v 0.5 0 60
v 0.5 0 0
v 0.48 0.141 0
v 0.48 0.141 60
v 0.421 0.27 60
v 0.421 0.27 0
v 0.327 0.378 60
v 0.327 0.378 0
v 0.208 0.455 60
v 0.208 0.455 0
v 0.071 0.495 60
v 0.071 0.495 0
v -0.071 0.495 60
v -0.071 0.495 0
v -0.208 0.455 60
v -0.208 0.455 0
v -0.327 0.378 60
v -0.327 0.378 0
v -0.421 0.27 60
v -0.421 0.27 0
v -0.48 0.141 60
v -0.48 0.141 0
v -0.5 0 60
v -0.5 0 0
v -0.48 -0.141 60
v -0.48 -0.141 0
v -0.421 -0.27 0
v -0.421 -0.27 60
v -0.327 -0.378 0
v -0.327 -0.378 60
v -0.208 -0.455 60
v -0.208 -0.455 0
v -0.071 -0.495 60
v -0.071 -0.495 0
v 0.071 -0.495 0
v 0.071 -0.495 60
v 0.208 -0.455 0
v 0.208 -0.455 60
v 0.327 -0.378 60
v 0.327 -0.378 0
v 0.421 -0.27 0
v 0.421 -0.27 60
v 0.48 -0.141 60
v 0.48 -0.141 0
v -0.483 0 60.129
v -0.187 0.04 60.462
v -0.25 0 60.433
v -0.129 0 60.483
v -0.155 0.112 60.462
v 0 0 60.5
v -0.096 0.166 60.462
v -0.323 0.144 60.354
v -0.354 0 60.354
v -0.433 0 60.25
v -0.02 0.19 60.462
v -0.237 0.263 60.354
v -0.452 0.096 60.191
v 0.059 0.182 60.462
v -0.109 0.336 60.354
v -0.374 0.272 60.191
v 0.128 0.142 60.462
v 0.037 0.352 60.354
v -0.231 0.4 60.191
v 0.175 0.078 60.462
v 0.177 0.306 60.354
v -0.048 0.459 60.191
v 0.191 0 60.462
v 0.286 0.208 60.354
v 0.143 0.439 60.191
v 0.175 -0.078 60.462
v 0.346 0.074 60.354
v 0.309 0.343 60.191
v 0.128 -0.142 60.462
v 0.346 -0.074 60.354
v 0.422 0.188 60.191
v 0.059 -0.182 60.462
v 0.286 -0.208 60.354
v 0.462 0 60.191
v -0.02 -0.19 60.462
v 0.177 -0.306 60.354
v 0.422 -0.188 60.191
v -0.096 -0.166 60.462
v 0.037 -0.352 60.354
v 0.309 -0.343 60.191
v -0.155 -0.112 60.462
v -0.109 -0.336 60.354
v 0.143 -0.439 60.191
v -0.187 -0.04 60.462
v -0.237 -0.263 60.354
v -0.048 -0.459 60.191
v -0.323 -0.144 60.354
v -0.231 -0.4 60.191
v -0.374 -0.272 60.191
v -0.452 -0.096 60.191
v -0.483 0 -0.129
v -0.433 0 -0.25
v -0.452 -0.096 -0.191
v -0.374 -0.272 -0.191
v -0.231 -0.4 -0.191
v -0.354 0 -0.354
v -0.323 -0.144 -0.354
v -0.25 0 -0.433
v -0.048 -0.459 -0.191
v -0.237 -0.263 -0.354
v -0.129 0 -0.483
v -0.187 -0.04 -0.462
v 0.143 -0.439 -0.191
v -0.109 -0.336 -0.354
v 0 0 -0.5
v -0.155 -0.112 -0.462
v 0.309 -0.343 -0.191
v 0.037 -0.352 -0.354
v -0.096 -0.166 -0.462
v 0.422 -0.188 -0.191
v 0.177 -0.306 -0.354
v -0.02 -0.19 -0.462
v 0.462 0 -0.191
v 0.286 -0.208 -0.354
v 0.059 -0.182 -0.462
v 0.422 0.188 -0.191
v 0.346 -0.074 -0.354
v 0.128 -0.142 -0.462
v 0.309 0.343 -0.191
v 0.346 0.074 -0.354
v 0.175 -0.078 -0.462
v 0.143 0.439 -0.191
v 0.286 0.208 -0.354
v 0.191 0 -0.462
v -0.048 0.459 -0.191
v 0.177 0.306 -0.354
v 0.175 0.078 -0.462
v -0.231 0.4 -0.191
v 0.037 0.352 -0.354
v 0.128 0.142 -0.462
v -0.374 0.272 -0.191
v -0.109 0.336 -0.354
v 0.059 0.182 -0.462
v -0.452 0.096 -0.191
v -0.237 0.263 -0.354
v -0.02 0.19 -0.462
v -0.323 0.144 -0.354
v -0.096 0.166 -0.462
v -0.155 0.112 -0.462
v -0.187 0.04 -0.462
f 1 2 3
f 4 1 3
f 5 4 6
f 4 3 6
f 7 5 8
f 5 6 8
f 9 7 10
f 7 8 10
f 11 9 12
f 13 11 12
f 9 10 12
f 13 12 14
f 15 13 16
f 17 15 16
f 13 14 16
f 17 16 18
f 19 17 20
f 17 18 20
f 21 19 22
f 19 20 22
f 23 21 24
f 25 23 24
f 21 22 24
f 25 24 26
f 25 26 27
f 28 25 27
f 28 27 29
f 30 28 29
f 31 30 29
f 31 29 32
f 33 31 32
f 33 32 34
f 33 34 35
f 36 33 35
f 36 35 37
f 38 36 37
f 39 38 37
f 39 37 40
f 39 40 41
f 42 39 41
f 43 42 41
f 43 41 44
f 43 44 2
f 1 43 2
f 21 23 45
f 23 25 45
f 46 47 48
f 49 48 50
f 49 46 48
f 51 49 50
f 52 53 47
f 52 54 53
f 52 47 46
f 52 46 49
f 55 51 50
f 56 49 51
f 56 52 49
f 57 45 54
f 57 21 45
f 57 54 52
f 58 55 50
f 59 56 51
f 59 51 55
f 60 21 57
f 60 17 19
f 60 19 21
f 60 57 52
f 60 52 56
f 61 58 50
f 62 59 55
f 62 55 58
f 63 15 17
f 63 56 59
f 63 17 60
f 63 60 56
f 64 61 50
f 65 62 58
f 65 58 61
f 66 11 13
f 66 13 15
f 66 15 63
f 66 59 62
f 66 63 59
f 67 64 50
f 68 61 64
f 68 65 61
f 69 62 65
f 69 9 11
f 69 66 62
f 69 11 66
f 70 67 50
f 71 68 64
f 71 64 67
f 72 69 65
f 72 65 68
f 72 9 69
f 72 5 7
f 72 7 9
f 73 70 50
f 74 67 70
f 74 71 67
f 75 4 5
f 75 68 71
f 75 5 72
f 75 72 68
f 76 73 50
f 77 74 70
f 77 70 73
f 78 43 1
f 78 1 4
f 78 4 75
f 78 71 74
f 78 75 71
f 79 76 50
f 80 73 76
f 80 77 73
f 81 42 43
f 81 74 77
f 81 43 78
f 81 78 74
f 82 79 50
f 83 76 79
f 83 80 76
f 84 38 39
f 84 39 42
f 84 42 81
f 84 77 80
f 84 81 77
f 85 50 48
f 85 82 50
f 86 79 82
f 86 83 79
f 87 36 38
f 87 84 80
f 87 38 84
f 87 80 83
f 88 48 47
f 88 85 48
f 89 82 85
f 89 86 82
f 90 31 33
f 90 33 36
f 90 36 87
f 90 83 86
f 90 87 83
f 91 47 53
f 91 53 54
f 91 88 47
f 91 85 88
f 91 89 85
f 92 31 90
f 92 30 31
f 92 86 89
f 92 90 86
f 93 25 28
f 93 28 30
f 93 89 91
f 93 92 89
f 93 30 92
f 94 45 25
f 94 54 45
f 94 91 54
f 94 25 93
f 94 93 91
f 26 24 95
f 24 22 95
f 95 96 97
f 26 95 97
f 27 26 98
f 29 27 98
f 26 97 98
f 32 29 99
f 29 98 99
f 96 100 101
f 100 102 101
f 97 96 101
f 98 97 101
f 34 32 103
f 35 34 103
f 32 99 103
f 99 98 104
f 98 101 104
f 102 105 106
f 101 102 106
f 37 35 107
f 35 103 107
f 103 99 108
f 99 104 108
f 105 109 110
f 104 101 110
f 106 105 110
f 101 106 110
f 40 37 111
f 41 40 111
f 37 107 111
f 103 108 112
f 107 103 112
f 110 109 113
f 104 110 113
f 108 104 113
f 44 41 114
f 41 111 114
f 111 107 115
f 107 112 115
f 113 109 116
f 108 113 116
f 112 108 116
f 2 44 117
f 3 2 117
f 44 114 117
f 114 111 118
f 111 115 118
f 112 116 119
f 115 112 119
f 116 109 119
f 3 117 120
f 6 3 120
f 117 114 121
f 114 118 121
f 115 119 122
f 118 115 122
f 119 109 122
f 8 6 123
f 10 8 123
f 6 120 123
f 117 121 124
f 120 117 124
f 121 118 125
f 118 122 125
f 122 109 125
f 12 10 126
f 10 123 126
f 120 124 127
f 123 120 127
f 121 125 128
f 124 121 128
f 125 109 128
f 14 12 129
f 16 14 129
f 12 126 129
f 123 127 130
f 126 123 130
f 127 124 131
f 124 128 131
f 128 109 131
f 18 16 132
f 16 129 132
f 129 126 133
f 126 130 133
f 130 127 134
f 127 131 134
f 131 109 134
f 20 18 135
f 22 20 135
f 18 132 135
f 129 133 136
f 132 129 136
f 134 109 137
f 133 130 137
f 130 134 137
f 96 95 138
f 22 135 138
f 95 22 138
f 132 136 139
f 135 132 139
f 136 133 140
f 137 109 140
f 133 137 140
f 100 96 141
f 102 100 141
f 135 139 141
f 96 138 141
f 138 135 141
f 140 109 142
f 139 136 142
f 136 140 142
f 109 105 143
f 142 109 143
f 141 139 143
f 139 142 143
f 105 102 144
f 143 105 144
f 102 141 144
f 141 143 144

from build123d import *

# Parameters (mm, degrees)
ESQUISSE2_R          = 0.5
BASE_EXTRUSION_DEPTH = 60


with BuildPart() as part:
    # Esquisse2 → Base-Extrusion (new body)
    with BuildSketch(Plane.XY):
        Circle(ESQUISSE2_R)
    extrude(amount=BASE_EXTRUSION_DEPTH)

    # Esquisse7 → Boss.-Révol.1 (revolve)
    with BuildSketch(Plane(origin=(0, 0, 0), x_dir=(1, 0, 0), z_dir=(0, 1, 0))):
        with BuildLine():
            Line((0, -60), (0, -60.5))
            ThreePointArc((0, -60.5), (-0.353553391, -60.353553391), (-0.5, -60))
            Line((-0.5, -60), (0, -60))
        make_face()
    revolve(axis=Axis((0, 0, 66.095405801), (0, 0, -1)))

    # Esquisse8 → Boss.-Révol.2 (revolve)
    with BuildSketch(Plane(origin=(0, 0, 0), x_dir=(1, 0, 0), z_dir=(0, 1, 0))):
        with BuildLine():
            Line((0, 0), (-0.5, 0))
            ThreePointArc((-0.5, 0), (-0.353553391, 0.353553391), (0, 0.5))
            Line((0, 0.5), (0, 0))
        make_face()
    revolve(axis=Axis((0, 0, -7.993801509), (0, 0, 1)))


solid = part.part
